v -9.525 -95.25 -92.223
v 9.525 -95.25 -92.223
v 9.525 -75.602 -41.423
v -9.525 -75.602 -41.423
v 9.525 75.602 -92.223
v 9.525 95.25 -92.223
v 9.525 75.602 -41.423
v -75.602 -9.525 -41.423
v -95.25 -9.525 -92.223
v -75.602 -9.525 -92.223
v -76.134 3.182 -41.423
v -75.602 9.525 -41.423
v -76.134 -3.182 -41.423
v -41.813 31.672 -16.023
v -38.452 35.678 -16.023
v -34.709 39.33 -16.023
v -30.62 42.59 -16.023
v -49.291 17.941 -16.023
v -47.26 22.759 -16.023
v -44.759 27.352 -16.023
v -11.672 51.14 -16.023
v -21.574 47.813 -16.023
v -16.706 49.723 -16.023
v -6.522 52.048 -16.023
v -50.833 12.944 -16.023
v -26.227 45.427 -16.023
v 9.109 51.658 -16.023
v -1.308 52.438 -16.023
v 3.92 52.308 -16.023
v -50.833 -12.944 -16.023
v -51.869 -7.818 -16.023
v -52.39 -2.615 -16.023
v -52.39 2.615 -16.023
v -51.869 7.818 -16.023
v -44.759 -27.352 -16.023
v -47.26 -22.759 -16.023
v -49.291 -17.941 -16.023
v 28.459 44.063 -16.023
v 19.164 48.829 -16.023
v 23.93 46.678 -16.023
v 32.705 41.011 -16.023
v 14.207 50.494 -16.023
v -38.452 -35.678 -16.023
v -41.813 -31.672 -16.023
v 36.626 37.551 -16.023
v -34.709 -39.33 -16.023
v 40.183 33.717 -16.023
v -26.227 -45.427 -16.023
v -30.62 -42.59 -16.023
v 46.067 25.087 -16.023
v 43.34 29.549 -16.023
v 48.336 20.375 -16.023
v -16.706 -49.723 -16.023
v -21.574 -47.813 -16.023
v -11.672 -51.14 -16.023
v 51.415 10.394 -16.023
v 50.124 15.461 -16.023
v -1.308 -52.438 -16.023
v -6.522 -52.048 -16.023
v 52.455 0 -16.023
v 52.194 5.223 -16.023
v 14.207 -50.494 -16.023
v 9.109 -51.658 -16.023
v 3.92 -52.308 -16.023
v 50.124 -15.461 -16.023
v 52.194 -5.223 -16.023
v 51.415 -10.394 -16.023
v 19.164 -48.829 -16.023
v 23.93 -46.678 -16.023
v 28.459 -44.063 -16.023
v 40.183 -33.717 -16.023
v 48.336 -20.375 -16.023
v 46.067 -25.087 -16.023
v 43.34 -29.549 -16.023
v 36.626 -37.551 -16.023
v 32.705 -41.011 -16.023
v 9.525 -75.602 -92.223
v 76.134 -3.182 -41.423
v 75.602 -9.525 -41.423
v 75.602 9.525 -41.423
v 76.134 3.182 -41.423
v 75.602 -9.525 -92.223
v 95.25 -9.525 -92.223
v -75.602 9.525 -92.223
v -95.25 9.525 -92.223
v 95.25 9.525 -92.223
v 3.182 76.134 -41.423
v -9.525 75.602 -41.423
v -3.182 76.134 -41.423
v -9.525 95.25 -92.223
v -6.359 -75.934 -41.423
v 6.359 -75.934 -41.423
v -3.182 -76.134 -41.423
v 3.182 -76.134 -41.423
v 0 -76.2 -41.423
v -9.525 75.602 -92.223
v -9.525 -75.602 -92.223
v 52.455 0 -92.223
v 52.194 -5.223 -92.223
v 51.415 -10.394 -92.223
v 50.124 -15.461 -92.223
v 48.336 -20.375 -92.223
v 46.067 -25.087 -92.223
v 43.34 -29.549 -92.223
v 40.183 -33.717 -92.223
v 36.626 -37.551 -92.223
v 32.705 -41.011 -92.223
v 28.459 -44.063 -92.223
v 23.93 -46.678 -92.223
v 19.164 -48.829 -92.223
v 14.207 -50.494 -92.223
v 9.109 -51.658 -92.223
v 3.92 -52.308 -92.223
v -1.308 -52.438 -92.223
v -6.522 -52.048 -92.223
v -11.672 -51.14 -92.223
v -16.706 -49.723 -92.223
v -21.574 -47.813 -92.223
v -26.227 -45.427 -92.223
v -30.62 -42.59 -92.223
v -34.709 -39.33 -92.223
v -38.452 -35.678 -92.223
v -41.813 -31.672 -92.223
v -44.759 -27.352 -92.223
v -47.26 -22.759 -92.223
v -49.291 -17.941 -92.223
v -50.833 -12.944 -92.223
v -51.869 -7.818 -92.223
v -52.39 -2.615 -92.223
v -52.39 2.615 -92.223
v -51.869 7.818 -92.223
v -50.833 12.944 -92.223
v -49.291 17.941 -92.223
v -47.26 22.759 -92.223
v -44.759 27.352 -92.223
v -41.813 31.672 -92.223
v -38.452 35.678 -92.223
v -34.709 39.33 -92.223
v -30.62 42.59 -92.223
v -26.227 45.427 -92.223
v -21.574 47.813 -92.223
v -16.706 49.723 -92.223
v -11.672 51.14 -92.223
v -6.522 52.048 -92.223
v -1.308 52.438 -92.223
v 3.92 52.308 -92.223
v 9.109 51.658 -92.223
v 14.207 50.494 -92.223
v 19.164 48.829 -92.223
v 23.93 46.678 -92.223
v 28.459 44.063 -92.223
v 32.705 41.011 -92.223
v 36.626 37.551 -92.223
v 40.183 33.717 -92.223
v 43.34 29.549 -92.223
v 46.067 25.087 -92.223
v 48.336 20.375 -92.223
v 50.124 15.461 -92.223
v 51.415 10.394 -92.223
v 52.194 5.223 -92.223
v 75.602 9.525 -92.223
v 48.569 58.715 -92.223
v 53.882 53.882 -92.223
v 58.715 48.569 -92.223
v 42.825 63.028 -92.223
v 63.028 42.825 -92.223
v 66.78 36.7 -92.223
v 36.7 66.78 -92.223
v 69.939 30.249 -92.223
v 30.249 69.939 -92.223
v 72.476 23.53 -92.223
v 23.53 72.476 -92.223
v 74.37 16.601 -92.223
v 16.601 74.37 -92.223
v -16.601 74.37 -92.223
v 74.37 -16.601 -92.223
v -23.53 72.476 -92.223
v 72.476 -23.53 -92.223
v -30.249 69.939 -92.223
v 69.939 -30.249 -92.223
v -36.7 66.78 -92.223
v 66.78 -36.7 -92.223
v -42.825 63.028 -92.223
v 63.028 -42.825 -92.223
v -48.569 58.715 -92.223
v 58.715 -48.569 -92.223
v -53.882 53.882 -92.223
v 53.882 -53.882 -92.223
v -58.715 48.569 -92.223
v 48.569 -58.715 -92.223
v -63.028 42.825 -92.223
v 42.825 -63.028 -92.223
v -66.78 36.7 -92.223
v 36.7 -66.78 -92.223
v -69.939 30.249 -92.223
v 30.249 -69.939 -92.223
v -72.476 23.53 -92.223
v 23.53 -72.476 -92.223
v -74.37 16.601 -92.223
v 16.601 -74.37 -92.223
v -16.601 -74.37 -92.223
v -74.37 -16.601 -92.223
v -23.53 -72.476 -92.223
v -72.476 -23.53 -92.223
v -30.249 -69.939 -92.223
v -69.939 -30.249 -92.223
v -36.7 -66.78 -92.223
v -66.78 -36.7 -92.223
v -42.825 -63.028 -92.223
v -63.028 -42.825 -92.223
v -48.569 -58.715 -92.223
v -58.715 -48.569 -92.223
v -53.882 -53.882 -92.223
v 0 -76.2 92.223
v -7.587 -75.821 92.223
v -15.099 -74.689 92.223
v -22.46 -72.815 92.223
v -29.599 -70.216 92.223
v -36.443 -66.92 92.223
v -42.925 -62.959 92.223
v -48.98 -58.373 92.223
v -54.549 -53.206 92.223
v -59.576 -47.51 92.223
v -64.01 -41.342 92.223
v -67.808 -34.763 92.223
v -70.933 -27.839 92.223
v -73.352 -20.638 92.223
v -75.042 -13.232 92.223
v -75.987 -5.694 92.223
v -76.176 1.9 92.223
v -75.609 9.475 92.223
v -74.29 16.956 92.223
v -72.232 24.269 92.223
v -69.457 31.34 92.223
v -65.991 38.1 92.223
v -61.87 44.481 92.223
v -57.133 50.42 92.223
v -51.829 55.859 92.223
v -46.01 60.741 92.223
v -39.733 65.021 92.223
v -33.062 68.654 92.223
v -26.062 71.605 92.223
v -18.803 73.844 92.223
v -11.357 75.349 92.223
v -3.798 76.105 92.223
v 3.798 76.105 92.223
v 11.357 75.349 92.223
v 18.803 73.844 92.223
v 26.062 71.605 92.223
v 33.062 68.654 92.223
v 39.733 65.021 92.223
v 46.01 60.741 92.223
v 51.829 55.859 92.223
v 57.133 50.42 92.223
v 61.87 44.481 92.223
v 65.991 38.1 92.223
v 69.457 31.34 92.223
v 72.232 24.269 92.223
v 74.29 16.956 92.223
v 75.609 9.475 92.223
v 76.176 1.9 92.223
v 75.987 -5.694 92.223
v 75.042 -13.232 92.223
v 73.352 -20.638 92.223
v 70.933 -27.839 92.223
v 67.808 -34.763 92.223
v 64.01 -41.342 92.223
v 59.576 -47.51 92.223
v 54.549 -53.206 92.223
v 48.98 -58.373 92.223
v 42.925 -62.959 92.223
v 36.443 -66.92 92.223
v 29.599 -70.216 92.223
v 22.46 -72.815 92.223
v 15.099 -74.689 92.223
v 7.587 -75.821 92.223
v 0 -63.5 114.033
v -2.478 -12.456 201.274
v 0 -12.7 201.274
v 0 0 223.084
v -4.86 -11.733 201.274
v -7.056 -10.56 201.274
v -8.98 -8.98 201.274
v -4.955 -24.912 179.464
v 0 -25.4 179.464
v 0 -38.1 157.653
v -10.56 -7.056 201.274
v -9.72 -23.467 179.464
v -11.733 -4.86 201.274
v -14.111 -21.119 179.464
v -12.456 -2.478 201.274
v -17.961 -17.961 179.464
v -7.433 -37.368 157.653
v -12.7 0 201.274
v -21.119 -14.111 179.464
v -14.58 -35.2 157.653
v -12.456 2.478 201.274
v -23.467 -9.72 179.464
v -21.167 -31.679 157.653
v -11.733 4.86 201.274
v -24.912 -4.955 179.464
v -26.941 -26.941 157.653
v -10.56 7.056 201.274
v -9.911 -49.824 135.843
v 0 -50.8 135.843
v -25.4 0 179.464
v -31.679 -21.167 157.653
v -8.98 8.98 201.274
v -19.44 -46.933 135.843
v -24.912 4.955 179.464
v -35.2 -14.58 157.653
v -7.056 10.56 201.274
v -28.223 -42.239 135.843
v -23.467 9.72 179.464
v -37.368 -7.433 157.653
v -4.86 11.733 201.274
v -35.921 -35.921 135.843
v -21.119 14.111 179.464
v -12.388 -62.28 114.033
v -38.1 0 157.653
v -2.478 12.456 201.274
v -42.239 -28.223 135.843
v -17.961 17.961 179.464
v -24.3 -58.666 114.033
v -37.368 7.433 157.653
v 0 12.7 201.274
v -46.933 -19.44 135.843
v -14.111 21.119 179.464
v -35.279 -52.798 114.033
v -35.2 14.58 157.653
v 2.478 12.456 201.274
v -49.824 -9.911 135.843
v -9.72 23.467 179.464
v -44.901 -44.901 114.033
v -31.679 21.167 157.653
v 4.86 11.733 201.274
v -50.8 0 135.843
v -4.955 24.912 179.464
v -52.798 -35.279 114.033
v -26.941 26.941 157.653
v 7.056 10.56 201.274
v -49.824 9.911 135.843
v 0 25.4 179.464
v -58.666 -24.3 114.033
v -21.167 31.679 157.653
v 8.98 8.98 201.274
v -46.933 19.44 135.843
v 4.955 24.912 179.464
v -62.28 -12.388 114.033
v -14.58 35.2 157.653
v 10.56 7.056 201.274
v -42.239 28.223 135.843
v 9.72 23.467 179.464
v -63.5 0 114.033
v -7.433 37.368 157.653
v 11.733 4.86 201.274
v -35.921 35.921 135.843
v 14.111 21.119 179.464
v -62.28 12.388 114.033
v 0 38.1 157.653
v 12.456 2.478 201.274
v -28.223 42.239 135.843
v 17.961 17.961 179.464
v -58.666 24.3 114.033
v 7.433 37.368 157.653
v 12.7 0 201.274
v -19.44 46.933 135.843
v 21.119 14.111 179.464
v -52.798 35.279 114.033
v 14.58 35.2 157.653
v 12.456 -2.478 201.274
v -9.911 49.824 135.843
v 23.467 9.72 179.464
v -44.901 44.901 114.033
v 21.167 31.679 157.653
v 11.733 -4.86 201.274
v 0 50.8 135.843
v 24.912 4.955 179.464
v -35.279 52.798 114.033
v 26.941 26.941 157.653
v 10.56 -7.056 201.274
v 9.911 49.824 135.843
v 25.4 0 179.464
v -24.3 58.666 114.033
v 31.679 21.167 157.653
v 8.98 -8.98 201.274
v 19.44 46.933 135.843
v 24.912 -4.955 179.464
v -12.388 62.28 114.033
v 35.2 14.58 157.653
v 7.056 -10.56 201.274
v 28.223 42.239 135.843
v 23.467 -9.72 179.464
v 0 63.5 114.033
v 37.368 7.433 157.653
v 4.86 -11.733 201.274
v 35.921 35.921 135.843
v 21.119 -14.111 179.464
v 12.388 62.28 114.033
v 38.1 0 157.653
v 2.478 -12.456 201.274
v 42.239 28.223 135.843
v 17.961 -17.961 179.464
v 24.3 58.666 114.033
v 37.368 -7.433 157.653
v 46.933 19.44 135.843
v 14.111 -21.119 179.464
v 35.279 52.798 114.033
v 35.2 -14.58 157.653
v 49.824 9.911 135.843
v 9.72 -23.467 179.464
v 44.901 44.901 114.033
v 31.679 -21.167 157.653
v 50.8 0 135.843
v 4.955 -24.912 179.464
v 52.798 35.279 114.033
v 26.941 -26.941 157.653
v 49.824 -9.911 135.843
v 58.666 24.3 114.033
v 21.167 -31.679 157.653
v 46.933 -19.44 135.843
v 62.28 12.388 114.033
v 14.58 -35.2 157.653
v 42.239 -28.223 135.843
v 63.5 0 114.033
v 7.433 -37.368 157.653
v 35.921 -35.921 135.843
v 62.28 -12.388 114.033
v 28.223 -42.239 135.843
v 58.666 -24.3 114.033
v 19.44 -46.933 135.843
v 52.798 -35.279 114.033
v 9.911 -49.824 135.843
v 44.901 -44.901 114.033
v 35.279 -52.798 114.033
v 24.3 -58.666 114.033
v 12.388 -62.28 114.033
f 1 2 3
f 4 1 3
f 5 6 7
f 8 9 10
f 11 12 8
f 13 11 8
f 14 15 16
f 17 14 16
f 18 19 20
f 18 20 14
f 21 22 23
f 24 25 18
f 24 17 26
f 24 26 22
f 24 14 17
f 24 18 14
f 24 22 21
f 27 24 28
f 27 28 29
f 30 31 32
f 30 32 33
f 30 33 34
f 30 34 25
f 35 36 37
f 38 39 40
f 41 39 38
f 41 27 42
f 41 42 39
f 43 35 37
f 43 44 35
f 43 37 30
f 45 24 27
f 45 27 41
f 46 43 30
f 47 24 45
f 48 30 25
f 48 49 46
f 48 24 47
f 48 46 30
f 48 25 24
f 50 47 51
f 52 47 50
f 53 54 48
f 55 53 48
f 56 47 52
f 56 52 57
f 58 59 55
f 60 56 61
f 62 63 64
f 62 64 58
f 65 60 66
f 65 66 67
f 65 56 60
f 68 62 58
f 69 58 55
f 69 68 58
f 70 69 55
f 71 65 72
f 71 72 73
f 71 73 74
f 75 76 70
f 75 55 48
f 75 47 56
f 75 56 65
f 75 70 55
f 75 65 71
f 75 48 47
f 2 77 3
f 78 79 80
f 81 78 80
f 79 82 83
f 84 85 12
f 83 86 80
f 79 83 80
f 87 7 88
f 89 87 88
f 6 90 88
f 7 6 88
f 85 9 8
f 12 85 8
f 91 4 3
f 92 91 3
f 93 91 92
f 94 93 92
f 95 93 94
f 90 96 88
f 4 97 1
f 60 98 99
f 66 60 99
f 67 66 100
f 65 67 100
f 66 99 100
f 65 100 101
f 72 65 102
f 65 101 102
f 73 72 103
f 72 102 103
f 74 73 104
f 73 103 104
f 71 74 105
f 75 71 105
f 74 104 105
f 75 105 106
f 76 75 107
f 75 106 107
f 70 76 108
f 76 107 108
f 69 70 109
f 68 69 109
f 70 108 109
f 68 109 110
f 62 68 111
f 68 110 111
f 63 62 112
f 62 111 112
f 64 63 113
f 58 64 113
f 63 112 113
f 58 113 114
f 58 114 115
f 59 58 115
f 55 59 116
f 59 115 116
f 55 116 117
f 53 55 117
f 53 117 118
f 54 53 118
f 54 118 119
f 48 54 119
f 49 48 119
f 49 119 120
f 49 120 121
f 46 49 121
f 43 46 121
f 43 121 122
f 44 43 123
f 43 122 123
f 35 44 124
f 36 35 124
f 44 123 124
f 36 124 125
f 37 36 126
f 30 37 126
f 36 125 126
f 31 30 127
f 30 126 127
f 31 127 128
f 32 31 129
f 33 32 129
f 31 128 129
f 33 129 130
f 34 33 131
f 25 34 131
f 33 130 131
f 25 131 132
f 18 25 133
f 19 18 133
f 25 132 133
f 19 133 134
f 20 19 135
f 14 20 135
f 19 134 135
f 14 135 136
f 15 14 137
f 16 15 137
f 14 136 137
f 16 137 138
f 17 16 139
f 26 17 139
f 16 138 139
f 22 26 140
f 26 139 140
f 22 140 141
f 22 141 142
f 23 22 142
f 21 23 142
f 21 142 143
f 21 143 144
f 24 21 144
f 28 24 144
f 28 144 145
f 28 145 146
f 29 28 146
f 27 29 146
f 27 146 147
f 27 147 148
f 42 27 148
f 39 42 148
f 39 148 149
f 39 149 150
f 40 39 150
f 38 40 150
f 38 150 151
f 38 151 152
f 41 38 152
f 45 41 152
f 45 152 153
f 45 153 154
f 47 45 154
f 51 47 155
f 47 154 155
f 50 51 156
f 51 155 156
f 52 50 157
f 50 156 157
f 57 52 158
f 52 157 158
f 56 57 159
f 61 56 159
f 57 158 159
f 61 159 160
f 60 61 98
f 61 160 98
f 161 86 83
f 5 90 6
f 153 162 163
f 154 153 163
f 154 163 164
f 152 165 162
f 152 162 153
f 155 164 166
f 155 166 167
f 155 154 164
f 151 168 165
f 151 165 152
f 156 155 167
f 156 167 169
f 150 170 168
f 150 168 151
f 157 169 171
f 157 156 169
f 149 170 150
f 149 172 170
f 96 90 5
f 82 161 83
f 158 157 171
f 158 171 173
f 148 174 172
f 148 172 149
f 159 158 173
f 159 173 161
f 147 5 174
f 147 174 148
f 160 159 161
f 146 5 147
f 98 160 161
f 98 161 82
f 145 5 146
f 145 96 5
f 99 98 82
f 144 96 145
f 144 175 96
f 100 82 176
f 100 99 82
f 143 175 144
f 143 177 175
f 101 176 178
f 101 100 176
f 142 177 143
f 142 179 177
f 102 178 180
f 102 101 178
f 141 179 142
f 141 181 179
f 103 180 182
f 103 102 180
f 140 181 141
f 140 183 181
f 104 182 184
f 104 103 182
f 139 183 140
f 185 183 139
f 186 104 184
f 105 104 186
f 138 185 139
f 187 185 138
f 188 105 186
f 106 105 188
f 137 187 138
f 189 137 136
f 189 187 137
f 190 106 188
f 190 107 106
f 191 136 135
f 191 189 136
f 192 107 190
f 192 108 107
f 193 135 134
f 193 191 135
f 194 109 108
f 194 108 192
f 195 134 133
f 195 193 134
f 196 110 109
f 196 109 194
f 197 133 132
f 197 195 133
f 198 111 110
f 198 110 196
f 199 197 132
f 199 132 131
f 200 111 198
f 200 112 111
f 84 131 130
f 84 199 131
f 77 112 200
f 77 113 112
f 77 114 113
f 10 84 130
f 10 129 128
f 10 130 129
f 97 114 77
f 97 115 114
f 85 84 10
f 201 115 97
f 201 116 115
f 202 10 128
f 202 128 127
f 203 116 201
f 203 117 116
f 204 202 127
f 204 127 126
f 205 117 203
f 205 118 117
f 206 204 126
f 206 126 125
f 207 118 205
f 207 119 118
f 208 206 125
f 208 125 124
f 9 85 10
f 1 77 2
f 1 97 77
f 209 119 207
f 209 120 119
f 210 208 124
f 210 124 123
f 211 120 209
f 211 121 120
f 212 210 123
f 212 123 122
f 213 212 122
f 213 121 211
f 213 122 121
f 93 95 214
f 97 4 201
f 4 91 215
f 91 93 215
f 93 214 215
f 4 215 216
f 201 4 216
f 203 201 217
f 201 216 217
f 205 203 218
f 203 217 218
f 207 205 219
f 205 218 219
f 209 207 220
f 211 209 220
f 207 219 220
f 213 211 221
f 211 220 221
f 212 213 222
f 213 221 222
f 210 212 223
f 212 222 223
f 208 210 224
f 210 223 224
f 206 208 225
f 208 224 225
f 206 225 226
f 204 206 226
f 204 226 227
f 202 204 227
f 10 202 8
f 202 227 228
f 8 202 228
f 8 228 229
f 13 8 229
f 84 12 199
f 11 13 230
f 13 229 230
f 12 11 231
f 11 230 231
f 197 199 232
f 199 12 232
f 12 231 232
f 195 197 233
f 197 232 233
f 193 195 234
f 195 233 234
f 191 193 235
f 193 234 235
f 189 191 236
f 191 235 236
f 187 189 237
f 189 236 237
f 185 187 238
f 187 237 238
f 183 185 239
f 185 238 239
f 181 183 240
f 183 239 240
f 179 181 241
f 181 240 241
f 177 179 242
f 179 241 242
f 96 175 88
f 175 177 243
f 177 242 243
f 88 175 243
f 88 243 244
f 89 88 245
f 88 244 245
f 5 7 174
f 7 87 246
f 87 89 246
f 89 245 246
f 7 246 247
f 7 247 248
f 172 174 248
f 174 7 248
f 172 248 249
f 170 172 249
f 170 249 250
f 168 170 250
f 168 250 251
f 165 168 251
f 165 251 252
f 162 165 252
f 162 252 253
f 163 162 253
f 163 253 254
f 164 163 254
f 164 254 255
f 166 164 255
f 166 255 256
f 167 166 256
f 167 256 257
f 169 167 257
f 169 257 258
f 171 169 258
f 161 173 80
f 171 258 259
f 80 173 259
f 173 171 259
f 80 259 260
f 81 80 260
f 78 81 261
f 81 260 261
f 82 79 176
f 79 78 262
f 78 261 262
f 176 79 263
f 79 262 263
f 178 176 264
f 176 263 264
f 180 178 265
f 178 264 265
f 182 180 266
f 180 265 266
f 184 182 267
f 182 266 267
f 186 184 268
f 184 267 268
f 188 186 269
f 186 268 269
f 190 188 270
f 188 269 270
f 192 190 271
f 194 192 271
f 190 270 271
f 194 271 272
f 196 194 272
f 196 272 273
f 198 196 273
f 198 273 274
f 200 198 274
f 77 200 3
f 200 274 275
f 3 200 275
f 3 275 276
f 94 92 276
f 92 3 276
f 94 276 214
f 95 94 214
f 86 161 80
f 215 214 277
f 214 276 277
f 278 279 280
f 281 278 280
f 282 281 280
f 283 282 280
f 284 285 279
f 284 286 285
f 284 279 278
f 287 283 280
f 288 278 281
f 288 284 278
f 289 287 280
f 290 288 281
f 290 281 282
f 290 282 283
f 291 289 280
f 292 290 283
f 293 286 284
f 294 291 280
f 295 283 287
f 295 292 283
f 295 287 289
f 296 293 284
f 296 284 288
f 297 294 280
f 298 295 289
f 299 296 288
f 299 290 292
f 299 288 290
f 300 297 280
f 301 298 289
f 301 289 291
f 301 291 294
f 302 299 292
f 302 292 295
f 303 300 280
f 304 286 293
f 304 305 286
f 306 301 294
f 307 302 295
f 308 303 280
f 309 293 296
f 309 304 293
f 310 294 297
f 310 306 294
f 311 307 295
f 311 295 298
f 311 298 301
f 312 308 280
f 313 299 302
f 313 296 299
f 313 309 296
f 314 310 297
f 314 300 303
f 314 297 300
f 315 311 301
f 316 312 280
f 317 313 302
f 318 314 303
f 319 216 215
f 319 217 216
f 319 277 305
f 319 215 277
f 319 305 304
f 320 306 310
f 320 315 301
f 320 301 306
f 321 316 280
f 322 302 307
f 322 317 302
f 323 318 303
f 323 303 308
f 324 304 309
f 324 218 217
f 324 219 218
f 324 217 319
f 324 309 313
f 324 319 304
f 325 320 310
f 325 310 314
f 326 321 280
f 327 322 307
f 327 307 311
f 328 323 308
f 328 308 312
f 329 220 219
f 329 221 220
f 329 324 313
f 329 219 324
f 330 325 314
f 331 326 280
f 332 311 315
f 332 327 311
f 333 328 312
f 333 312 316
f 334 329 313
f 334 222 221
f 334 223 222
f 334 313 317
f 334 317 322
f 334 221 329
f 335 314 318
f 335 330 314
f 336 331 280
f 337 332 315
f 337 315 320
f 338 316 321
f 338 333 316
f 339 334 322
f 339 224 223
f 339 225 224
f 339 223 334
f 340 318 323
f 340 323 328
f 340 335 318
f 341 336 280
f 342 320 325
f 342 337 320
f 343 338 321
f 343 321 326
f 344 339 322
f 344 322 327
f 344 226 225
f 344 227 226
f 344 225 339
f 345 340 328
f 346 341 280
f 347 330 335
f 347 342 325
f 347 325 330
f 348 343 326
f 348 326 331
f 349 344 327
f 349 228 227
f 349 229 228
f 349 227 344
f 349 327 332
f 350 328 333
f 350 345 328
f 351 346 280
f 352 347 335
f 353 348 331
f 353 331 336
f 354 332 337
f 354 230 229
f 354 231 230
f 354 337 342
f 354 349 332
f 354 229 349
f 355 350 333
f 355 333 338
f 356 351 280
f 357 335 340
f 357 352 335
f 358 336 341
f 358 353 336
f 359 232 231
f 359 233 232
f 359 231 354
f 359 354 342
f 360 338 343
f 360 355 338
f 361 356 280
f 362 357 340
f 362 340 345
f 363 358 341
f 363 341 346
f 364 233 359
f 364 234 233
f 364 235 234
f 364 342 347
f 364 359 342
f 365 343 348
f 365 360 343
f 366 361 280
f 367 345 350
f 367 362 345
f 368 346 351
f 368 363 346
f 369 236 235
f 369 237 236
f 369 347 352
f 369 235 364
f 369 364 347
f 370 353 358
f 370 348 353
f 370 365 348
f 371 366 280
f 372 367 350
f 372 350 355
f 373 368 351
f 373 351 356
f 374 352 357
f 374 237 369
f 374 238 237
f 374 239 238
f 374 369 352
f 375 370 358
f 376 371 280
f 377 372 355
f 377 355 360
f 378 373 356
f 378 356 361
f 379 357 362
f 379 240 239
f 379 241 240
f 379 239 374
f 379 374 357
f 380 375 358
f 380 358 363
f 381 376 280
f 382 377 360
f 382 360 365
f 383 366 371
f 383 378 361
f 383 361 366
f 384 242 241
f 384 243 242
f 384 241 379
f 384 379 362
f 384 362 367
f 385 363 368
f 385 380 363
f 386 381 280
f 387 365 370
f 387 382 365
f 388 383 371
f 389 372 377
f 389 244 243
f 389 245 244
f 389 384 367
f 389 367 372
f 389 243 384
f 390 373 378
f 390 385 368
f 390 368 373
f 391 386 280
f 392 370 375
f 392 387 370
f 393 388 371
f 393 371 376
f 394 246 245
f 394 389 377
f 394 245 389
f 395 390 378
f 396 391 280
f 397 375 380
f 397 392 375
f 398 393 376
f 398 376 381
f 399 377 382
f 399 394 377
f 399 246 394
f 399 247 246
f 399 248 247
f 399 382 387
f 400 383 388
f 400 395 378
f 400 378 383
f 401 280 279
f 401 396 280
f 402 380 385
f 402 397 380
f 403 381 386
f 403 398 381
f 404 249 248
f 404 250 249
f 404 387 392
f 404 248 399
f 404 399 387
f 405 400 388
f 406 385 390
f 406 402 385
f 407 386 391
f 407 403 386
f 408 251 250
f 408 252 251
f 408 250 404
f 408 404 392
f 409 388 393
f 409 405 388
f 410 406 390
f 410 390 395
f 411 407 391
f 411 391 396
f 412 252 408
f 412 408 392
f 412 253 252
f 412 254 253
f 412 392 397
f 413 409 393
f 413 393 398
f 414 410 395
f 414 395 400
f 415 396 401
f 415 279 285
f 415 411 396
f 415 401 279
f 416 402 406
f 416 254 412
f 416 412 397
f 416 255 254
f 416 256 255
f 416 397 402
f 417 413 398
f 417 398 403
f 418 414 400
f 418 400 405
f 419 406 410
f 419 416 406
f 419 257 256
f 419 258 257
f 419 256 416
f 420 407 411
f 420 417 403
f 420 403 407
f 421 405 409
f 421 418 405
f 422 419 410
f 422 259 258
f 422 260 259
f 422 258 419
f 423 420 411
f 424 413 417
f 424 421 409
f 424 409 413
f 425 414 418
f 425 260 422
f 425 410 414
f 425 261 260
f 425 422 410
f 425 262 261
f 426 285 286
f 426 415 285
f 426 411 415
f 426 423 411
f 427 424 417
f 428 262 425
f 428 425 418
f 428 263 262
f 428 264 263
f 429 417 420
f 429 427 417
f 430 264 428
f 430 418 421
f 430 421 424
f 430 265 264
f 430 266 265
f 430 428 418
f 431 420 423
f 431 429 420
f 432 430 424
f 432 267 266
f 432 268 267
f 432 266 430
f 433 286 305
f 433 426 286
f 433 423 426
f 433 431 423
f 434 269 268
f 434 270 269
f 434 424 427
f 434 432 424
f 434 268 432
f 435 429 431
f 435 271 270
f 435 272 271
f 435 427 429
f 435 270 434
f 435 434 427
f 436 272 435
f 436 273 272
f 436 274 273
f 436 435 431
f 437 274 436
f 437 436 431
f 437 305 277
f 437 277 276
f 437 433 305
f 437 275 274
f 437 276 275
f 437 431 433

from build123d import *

# Parameters (mm, degrees)
F0_W      = 76.2
F0_H      = 184.446418
F2_R      = 52.454734
F3_DEPTH  = 76.2
F4_W      = 38.1
F4_H      = 9.525
F4_W_2    = 9.525
F4_H_2    = 38.1
F5_DEPTH  = 50.8
F7_DEPTH  = 104.776
F9_DEPTH  = 104.776
F11_DEPTH = 104.776
F13_DEPTH = 104.776


with BuildPart() as f1:
    # F0 (on Right) → F1 (revolve)
    with BuildSketch(Plane.YZ):
        Polygon((-76.2, 92.223209), (0, 92.223209), (0, 223.083655), align=None)
        with Locations((-38.1, 0)):
            Rectangle(F0_W, F0_H)
    revolve(axis=Axis((0, 0, 0), (0, 0, -1)))

    # F2 (on face) → F3 (cut)
    with BuildSketch(Plane(origin=(0, 0, -92.223209), x_dir=(1, 0, 0), z_dir=(0, 0, -1))):
        Circle(F2_R)
    extrude(amount=-F3_DEPTH, mode=Mode.SUBTRACT)

    # F4 (on face) → F5 (join)
    with BuildSketch(Plane(origin=(0, 0, -92.223209), x_dir=(1, 0, 0), z_dir=(0, 0, -1))):
        with Locations((76.2, -4.7625)):
            Rectangle(F4_W, F4_H)
        with Locations((76.2, 4.7625)):
            Rectangle(F4_W, F4_H)
        with Locations((-76.2, -4.7625)):
            Rectangle(F4_W, F4_H)
        with Locations((4.7625, 76.2)):
            Rectangle(F4_W_2, F4_H_2)
        with Locations((-4.7625, 76.2)):
            Rectangle(F4_W_2, F4_H_2)
        with Locations((-76.2, 4.7625)):
            Rectangle(F4_W, F4_H)
        Polygon((9.525, -57.15), (0, -57.15), (-9.525, -57.15), (-9.525, -95.25), (9.525, -95.25), align=None)
    extrude(amount=-F5_DEPTH)

    # F6 (on face) → F7 (cut, through all)
    with BuildSketch(Plane.XZ.offset(9.525)):
        Polygon((-95.25, -41.423209), (-95.25, -92.223209), (-75.602344, -41.423209), align=None)
    extrude(amount=-F7_DEPTH, mode=Mode.SUBTRACT)

    # F8 (on face) → F9 (cut, through all)
    with BuildSketch(Plane.YZ.offset(9.525)):
        Polygon((-95.25, -41.423209), (-95.25, -92.223209), (-75.602344, -41.423209), (-85.426172, -41.423209), align=None)
    extrude(amount=-F9_DEPTH, mode=Mode.SUBTRACT)

    # F10 (on face) → F11 (cut, through all)
    with BuildSketch(Plane(origin=(-9.525, 0, 0), x_dir=(0, -1, 0), z_dir=(-1, 0, 0))):
        Polygon((-95.25, -41.423209), (-95.25, -92.223209), (-75.602344, -41.423209), align=None)
    extrude(amount=-F11_DEPTH, mode=Mode.SUBTRACT)

    # F12 (on face) → F13 (cut, through all)
    with BuildSketch(Plane(origin=(0, 9.525, 0), x_dir=(-1, 0, 0), z_dir=(0, 1, 0))):
        Polygon((-95.25, -41.423209), (-95.25, -92.223209), (-75.602344, -41.423209), align=None)
    extrude(amount=-F13_DEPTH, mode=Mode.SUBTRACT)


solid = f1.part
